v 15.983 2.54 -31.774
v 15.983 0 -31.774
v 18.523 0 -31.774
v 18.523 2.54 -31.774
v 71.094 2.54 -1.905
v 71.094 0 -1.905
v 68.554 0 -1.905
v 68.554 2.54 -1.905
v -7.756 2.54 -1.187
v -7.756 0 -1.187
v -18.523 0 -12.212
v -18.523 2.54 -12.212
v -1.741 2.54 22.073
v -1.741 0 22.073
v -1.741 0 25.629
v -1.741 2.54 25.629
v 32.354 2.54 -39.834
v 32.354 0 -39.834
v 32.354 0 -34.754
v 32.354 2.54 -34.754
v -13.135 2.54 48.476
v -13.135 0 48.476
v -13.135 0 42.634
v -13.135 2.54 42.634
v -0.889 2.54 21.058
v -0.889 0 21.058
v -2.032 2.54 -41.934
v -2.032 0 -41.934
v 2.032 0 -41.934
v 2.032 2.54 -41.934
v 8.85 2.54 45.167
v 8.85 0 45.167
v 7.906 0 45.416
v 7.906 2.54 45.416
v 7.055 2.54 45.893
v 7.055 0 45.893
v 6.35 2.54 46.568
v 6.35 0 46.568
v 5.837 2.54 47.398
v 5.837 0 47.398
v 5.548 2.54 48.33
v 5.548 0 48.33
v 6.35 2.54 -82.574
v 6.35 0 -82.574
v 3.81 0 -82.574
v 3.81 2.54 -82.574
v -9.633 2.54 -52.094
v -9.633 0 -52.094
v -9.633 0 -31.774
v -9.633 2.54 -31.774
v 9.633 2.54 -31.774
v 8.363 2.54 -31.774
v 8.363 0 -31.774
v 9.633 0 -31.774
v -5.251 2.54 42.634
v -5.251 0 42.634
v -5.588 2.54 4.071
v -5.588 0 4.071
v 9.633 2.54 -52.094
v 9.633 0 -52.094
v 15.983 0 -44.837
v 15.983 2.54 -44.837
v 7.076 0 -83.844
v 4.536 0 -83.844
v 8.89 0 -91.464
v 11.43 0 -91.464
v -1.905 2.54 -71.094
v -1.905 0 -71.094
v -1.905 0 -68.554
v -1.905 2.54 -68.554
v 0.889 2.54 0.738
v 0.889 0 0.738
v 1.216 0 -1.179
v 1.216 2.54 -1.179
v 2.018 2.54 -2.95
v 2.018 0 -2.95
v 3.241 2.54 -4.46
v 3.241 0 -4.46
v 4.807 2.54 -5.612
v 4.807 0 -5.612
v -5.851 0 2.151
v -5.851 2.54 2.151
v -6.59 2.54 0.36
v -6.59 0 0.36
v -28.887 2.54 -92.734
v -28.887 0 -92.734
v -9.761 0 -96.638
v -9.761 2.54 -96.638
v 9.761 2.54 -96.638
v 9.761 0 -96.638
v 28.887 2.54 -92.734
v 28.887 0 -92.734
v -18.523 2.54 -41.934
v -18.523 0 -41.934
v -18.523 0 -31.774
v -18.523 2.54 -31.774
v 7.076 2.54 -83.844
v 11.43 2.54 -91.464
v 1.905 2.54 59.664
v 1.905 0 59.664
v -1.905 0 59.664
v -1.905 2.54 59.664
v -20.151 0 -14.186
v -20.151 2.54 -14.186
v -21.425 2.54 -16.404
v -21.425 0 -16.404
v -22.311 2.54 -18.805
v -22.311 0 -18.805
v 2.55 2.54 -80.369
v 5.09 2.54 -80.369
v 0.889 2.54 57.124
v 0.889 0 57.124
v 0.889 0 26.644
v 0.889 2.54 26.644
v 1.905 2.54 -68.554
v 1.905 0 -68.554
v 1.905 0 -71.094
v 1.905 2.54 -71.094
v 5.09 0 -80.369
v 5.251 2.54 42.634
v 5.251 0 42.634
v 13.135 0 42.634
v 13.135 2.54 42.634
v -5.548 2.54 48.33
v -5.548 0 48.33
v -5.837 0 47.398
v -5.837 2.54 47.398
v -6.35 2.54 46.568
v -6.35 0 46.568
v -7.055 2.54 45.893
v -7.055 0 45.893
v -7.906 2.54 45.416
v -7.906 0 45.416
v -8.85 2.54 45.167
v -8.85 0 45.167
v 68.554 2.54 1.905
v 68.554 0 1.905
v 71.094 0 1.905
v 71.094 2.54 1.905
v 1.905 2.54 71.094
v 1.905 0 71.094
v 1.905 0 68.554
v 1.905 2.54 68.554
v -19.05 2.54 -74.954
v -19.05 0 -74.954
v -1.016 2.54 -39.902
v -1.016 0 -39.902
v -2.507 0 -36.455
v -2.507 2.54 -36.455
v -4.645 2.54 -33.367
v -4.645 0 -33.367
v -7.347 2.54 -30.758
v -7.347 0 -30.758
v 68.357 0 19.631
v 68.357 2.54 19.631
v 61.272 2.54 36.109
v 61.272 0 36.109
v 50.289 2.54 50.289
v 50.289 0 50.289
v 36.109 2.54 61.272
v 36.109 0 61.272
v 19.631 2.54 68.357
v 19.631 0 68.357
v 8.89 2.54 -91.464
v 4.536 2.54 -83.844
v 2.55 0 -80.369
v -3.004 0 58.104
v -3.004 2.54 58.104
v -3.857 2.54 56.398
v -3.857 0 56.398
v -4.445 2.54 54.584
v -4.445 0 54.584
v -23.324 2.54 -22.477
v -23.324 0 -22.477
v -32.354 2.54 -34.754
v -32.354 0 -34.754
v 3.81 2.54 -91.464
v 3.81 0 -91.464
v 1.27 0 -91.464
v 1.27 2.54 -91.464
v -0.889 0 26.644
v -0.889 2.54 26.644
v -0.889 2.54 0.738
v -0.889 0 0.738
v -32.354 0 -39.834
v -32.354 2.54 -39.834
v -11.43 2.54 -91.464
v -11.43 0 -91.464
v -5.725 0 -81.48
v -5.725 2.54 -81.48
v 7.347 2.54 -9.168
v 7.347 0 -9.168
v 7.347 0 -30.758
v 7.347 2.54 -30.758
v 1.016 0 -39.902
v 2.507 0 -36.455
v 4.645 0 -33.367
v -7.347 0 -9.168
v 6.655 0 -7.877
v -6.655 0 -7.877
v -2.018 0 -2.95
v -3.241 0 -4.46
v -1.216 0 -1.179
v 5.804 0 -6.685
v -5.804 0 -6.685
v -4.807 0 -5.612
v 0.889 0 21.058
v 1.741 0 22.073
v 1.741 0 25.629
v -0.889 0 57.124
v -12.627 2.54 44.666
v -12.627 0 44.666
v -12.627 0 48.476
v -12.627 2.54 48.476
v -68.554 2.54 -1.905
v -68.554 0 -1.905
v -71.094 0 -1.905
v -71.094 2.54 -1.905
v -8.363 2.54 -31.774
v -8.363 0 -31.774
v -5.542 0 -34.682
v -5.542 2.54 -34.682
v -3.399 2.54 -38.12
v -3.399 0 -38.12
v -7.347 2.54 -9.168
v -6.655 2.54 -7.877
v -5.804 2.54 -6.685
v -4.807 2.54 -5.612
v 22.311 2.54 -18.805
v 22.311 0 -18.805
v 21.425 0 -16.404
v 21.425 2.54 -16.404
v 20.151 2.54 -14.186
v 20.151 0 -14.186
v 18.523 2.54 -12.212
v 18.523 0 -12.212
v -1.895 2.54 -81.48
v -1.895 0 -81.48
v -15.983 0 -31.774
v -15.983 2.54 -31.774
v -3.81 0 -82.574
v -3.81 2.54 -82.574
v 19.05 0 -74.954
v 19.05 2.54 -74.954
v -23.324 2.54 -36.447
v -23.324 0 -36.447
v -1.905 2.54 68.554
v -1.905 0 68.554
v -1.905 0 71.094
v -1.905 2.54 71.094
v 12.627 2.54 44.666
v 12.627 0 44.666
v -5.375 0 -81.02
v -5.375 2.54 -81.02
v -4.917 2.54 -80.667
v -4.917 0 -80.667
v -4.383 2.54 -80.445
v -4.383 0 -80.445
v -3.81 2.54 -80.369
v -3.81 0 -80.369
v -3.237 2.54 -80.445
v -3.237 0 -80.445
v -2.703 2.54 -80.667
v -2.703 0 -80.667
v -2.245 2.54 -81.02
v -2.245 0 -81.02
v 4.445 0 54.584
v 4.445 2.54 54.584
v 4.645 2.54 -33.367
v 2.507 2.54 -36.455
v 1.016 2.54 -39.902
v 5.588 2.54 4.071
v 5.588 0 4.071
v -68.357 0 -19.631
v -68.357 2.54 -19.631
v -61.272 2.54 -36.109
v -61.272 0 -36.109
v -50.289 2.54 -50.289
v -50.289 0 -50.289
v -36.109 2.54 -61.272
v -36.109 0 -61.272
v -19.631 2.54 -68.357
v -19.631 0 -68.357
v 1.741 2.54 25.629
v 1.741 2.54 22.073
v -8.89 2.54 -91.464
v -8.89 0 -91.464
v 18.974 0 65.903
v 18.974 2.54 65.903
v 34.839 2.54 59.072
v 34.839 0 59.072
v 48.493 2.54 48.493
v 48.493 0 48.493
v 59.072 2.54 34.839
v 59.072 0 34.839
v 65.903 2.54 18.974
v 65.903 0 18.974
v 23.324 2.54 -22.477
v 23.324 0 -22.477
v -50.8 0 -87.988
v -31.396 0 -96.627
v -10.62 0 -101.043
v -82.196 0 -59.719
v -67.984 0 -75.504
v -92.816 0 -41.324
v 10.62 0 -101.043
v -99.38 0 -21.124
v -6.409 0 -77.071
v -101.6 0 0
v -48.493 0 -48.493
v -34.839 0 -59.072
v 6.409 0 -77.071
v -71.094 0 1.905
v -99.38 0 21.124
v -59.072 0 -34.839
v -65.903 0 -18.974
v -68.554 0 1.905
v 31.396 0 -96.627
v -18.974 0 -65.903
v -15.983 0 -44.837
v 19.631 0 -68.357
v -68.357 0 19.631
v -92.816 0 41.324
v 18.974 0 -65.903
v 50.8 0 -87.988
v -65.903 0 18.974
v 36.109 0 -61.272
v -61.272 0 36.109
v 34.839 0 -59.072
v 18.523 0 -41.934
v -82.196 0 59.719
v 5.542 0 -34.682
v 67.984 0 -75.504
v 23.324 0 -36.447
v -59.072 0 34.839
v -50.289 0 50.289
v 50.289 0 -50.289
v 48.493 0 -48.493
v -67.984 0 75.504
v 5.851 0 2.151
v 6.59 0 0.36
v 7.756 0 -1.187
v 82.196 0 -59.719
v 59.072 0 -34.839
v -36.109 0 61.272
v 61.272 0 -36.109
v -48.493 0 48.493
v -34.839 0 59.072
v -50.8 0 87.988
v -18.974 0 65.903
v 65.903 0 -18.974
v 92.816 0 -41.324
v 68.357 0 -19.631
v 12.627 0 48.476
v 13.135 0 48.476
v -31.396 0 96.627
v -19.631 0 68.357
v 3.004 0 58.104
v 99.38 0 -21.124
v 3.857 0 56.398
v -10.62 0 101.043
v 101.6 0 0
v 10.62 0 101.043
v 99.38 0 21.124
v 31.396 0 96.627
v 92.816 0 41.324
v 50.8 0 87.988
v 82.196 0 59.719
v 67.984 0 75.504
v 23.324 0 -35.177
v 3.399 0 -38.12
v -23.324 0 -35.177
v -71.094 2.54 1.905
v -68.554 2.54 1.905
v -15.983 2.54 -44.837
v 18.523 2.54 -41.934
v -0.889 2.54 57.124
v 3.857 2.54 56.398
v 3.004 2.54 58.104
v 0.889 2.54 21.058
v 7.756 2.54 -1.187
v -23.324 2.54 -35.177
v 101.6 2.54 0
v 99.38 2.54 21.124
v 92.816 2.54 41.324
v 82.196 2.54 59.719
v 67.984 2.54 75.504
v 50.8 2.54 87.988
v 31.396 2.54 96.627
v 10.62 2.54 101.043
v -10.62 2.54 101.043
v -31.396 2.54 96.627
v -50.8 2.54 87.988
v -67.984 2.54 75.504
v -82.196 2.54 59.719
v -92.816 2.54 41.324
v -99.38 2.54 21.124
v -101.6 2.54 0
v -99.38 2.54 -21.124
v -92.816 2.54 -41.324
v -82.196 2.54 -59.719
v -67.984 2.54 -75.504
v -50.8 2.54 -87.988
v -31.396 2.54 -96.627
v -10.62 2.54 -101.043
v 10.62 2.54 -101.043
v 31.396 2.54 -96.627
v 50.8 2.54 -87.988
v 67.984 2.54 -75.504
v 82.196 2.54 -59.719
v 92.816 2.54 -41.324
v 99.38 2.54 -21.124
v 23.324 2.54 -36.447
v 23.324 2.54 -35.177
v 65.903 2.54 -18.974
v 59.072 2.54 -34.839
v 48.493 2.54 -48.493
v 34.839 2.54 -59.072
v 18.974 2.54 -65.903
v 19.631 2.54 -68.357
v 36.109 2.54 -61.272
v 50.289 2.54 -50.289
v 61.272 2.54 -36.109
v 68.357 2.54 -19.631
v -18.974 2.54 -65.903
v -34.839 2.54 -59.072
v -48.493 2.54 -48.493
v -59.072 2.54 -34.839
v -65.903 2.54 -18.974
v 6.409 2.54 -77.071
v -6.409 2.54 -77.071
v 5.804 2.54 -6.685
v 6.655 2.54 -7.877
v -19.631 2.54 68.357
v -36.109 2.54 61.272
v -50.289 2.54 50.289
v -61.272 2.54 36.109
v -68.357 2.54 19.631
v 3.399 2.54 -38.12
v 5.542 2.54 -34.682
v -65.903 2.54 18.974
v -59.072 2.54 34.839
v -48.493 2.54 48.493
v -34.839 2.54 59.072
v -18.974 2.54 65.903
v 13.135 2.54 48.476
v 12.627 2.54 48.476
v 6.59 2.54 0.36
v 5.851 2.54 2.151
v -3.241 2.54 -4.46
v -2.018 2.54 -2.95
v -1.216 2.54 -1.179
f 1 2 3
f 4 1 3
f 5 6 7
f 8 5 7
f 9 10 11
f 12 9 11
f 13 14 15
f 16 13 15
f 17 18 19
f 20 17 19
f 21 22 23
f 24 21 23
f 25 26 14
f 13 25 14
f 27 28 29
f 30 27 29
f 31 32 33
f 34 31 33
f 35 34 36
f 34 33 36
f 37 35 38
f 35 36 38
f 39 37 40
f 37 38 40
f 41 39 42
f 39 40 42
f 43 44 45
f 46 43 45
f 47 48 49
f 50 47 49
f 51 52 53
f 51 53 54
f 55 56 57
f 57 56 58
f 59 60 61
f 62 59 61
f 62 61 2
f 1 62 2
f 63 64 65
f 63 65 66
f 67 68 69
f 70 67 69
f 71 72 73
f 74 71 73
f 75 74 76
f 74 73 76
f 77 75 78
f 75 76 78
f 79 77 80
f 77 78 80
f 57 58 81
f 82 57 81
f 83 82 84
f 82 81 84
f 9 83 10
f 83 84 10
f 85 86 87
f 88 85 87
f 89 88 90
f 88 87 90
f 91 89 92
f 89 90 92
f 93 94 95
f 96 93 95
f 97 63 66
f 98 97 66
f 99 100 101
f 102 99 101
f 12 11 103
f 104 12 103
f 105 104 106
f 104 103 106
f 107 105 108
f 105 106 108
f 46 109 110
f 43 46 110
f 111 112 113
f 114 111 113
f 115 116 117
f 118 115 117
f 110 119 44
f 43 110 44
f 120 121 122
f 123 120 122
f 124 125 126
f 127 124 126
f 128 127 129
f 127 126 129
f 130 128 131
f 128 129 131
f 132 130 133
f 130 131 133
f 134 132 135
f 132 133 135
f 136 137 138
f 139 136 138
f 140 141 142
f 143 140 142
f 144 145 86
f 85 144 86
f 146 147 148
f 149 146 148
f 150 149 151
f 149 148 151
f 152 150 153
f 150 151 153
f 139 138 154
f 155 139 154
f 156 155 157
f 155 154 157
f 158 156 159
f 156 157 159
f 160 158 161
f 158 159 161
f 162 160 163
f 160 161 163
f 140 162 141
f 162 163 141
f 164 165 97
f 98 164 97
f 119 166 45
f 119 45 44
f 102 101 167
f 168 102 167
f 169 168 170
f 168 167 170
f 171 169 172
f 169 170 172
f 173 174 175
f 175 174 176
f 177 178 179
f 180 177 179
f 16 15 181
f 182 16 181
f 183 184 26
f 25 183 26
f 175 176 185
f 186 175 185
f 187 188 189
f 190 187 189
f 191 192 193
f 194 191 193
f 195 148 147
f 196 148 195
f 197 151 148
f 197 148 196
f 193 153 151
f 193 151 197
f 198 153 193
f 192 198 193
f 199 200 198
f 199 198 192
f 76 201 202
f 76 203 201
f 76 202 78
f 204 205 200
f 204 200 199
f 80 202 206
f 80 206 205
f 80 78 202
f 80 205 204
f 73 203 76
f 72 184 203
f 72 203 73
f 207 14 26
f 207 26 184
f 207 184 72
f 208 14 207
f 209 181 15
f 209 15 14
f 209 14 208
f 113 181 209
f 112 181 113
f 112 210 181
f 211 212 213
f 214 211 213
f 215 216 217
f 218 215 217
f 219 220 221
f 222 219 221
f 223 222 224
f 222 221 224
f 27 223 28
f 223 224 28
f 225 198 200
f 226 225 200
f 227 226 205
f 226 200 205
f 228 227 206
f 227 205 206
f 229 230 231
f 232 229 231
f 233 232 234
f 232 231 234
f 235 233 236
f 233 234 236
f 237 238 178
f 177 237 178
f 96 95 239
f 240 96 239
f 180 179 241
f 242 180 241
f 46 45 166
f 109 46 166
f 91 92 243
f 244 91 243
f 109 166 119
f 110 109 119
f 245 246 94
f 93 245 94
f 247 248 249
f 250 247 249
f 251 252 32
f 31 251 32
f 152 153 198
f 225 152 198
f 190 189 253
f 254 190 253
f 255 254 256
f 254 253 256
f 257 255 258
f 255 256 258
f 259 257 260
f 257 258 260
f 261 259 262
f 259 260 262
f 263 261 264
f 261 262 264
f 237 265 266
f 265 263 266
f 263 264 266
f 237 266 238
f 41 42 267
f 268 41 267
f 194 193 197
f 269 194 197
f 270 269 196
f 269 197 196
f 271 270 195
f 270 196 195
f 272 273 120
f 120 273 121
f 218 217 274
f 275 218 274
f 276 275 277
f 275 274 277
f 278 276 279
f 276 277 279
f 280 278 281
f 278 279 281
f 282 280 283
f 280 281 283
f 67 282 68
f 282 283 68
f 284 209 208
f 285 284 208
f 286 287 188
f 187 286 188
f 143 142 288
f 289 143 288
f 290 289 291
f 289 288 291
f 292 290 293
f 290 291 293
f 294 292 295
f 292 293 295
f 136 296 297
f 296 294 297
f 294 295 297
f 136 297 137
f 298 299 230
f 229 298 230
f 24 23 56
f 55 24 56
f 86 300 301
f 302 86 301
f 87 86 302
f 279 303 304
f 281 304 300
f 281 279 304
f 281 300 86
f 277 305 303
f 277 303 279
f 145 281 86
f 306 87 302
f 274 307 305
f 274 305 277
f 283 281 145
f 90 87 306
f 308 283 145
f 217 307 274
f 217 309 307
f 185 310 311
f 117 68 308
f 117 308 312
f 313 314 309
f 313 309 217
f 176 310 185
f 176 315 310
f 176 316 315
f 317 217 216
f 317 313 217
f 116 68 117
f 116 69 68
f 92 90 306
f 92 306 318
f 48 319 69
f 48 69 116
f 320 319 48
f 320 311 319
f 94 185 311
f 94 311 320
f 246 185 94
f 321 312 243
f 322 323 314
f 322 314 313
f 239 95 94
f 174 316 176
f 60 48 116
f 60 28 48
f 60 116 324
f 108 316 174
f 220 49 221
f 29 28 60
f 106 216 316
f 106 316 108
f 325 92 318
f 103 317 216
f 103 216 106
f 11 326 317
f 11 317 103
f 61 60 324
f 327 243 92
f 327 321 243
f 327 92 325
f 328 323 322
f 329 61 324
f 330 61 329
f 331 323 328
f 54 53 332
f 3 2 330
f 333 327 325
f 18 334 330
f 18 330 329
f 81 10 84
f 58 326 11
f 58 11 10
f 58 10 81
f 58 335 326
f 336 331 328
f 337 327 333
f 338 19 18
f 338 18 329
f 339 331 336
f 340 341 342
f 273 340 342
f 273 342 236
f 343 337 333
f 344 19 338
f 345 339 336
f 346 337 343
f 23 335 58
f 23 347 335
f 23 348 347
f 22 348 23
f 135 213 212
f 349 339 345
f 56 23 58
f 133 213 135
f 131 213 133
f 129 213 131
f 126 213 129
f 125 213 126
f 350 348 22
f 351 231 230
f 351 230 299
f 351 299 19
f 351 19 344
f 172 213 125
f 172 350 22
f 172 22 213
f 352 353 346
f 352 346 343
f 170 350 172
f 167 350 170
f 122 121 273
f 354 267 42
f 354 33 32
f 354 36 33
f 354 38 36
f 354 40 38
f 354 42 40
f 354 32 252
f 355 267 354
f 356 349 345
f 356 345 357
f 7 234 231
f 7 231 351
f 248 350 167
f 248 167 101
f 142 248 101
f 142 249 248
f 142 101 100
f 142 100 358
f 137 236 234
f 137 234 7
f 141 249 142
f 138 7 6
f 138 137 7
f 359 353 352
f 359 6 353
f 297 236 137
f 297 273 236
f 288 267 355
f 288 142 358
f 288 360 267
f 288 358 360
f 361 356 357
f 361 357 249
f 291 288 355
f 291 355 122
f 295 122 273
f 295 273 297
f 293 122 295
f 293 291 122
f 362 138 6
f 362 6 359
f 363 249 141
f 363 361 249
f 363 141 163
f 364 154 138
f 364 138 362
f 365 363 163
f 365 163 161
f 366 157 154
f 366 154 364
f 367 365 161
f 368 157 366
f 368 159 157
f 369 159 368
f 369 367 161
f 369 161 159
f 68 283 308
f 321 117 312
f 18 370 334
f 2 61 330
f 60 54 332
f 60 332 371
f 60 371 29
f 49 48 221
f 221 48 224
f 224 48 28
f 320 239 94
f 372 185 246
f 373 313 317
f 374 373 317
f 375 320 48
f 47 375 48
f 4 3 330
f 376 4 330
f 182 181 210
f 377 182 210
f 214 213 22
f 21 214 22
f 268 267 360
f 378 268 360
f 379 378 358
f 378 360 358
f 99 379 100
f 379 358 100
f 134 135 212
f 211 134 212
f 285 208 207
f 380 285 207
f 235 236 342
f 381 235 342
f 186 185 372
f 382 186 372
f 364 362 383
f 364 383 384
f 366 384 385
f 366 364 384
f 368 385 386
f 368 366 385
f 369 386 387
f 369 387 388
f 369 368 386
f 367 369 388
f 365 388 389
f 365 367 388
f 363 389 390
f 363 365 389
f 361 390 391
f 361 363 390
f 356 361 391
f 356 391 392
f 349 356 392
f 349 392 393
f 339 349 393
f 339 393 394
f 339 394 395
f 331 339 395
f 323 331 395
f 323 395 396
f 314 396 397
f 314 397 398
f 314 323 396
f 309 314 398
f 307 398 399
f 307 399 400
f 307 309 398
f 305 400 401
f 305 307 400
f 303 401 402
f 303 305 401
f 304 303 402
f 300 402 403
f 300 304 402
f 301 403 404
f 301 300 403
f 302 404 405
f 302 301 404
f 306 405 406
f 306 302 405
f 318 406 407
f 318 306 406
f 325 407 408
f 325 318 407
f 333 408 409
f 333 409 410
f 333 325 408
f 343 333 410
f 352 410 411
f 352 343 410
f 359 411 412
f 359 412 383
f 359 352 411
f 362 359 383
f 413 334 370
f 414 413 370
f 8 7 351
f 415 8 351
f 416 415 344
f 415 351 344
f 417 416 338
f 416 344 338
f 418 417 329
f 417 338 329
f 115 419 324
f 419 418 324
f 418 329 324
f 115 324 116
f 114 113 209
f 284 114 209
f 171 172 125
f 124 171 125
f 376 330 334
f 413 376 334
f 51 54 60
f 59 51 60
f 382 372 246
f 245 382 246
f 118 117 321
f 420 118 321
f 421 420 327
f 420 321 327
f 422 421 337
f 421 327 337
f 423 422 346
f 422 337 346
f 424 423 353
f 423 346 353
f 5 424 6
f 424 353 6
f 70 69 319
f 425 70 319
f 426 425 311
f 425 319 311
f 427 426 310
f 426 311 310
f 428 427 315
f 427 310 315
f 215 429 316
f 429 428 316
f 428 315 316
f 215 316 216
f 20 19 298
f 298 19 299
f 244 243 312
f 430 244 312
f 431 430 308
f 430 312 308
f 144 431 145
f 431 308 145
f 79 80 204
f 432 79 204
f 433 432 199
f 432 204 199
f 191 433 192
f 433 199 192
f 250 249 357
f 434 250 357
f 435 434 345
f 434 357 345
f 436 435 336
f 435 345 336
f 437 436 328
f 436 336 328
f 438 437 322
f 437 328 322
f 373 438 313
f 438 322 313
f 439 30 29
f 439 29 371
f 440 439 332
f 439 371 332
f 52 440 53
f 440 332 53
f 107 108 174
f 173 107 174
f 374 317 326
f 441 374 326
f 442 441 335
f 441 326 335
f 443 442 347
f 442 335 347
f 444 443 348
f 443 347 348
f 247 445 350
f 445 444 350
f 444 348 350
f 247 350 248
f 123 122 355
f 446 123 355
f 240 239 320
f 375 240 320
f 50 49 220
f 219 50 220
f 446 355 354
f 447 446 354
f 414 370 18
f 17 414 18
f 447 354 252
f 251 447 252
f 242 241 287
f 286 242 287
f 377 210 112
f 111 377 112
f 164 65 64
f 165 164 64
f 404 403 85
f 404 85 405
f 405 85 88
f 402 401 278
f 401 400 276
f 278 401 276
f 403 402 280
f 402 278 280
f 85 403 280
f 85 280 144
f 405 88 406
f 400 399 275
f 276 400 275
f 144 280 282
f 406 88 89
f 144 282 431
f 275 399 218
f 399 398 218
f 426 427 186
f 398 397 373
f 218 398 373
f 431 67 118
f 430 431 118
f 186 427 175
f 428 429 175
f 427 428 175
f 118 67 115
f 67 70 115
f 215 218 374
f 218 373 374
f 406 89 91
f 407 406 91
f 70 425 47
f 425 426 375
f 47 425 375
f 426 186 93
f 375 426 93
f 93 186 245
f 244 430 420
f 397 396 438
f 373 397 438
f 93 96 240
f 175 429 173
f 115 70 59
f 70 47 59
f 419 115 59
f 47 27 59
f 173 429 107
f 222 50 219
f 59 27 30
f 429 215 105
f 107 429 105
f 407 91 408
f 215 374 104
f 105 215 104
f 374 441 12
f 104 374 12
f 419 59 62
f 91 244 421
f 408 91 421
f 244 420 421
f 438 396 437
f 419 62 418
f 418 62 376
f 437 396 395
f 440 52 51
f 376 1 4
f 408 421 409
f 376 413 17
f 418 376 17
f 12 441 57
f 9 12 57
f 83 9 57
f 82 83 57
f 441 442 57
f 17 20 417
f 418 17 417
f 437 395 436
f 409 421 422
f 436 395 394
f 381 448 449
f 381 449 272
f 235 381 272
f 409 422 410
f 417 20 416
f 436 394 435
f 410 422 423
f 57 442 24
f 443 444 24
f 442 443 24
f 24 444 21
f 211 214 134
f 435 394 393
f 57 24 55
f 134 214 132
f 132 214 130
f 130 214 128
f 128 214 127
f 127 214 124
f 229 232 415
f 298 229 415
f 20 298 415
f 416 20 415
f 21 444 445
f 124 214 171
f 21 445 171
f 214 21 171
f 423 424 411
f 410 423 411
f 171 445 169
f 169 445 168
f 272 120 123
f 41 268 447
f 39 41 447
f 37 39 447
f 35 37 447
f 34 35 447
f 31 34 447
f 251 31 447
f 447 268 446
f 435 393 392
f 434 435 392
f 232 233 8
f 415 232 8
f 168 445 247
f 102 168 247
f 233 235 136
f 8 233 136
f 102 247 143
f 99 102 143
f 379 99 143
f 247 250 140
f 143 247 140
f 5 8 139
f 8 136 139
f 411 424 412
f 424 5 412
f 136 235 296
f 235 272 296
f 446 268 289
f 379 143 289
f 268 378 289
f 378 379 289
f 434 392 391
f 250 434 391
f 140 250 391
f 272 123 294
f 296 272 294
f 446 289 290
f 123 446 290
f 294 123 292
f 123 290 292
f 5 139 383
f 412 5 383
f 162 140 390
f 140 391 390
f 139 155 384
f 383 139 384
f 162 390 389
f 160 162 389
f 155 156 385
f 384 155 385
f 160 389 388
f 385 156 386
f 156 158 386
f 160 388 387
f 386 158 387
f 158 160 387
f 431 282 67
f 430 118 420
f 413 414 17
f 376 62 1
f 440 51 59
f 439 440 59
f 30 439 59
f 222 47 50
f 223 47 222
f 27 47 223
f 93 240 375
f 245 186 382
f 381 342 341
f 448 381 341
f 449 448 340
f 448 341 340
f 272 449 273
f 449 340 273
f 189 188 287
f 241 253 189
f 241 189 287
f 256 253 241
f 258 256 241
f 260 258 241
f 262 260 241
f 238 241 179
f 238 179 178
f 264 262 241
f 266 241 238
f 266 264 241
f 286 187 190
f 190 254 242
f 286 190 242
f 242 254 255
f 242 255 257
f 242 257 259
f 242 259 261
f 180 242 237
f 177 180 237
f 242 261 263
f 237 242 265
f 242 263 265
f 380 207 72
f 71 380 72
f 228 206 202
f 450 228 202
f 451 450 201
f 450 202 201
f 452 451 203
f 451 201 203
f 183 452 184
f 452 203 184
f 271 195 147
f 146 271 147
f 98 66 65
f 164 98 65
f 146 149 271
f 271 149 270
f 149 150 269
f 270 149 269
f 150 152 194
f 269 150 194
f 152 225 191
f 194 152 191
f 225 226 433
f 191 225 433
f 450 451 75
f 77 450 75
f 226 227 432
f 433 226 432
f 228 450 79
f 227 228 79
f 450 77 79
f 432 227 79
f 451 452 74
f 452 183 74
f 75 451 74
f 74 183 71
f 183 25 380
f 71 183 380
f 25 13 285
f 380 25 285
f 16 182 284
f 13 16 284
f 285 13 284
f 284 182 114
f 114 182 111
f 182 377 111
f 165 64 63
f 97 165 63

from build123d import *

# Parameters (mm, degrees)
F0_R     = 101.6
F1_DEPTH = 2.54
F3_DEPTH = 25.4
F5_DEPTH = 25.4
F7_DEPTH = 25.4


with BuildPart() as f1:
    # F0 (on Front) → F1 (new body)
    with BuildSketch(Plane.XZ):
        Circle(F0_R)
    extrude(amount=-F1_DEPTH)

    # F2 (on face) → F3 (cut)
    with BuildSketch(Plane.XZ):
        with BuildLine():
            Line((-68.553537, -1.905), (-71.094482, -1.905))
            ThreePointArc((-71.094482, -1.905), (-50.289434, -50.289434), (-1.905, -71.094482))
            Line((-1.905, -71.094482), (-1.905, -68.553537))
            ThreePointArc((-1.905, -68.553537), (-48.493383, -48.493383), (-68.553537, -1.905))
        make_face()
        with BuildLine():
            Line((-71.094482, 1.905), (-68.553537, 1.905))
            ThreePointArc((-68.553537, 1.905), (-48.493383, 48.493383), (-1.905, 68.553537))
            Line((-1.905, 68.553537), (-1.905, 71.094482))
            ThreePointArc((-1.905, 71.094482), (-50.289434, 50.289434), (-71.094482, 1.905))
        make_face()
        with BuildLine():
            Line((1.905, 71.094482), (1.905, 68.553537))
            ThreePointArc((1.905, 68.553537), (48.493383, 48.493383), (68.553537, 1.905))
            Line((68.553537, 1.905), (71.094482, 1.905))
            ThreePointArc((71.094482, 1.905), (50.289434, 50.289434), (1.905, 71.094482))
        make_face()
        with BuildLine():
            Line((71.094482, -1.905), (68.553537, -1.905))
            ThreePointArc((68.553537, -1.905), (48.493383, -48.493383), (1.905, -68.553537))
            Line((1.905, -68.553537), (1.905, -71.094482))
            ThreePointArc((1.905, -71.094482), (50.289434, -50.289434), (71.094482, -1.905))
        make_face()
    extrude(amount=-F3_DEPTH, mode=Mode.SUBTRACT)

    # F4 (on face) → F5 (cut)
    with BuildSketch(Plane.XZ):
        with BuildLine():
            Line((1.905, 59.663537), (0, 59.663537))
            Line((0, 59.663537), (0, 57.123537))
            Line((0, 57.123537), (0.889, 57.123537))
            Line((0.889, 57.123537), (0.889, 26.643537))
            Line((0.889, 26.643537), (1.740593, 25.628647))
            Line((1.740593, 25.628647), (1.740593, 22.072647))
            Line((1.740593, 22.072647), (0.889, 21.057757))
            Line((0.889, 21.057757), (0.889, 0.737757))
            ThreePointArc((0.889, 0.737757), (2.017691, -2.949643), (4.807212, -5.612243))
            ThreePointArc((4.807212, -5.612243), (6.248737, -7.267725), (7.347212, -9.168243))
            Line((7.347212, -9.168243), (7.347212, -30.758243))
            ThreePointArc((7.347212, -30.758243), (3.499435, -34.857914), (1.016, -39.902243))
            Line((1.016, -39.902243), (0, -39.902243))
            Line((0, -39.902243), (0, -41.934243))
            Line((0, -41.934243), (2.032, -41.934243))
            ThreePointArc((2.032, -41.934243), (4.378791, -36.343997), (8.363212, -31.774243))
            Line((8.363212, -31.774243), (9.633212, -31.774243))
            Line((9.633212, -31.774243), (9.633212, -52.094243))
            Line((9.633212, -52.094243), (15.983212, -44.8371))
            Line((15.983212, -44.8371), (15.983212, -31.774243))
            Line((15.983212, -31.774243), (18.523212, -31.774243))
            Line((18.523212, -31.774243), (18.523212, -41.934243))
            Line((18.523212, -41.934243), (23.324368, -36.447207))
            Line((23.324368, -36.447207), (23.324368, -35.177207))
            Line((23.324368, -35.177207), (32.354376, -39.833874))
            Line((32.354376, -39.833874), (32.354376, -34.753874))
            Line((32.354376, -34.753874), (23.324368, -22.477207))
            Line((23.324368, -22.477207), (22.310513, -18.804579))
            ThreePointArc((22.310513, -18.804579), (20.83457, -15.268376), (18.523212, -12.21211))
            Line((18.523212, -12.21211), (7.756104, -1.186821))
            ThreePointArc((7.756104, -1.186821), (6.163207, 1.232062), (5.588, 4.070628))
            Line((5.588, 4.070628), (5.25146, 42.634253))
            Line((5.25146, 42.634253), (13.134678, 42.634253))
            Line((13.134678, 42.634253), (13.134678, 48.476253))
            Line((13.134678, 48.476253), (12.626678, 48.476253))
            Line((12.626678, 48.476253), (12.626678, 44.666253))
            Line((12.626678, 44.666253), (8.849666, 45.166535))
            ThreePointArc((8.849666, 45.166535), (6.681256, 46.208204), (5.547666, 48.330007))
            Line((5.547666, 48.330007), (4.445, 54.583537))
            ThreePointArc((4.445, 54.583537), (3.462622, 57.267348), (1.905, 59.663537))
        make_face()
        with BuildLine():
            Line((0, 59.663537), (-1.905, 59.663537))
            ThreePointArc((-1.905, 59.663537), (-3.462622, 57.267348), (-4.445, 54.583537))
            Line((-4.445, 54.583537), (-5.547666, 48.330007))
            ThreePointArc((-5.547666, 48.330007), (-6.681256, 46.208204), (-8.849666, 45.166535))
            Line((-8.849666, 45.166535), (-12.626678, 44.666253))
            Line((-12.626678, 44.666253), (-12.626678, 48.476253))
            Line((-12.626678, 48.476253), (-13.134678, 48.476253))
            Line((-13.134678, 48.476253), (-13.134678, 42.634253))
            Line((-13.134678, 42.634253), (-5.25146, 42.634253))
            Line((-5.25146, 42.634253), (-5.588, 4.070628))
            ThreePointArc((-5.588, 4.070628), (-6.163207, 1.232062), (-7.756104, -1.186821))
            Line((-7.756104, -1.186821), (-18.523212, -12.21211))
            ThreePointArc((-18.523212, -12.21211), (-20.83457, -15.268376), (-22.310513, -18.804579))
            Line((-22.310513, -18.804579), (-23.324368, -22.477207))
            Line((-23.324368, -22.477207), (-32.354376, -34.753874))
            Line((-32.354376, -34.753874), (-32.354376, -39.833874))
            Line((-32.354376, -39.833874), (-23.324368, -35.177207))
            Line((-23.324368, -35.177207), (-23.324368, -36.447207))
            Line((-23.324368, -36.447207), (-18.523212, -41.934243))
            Line((-18.523212, -41.934243), (-18.523212, -31.774243))
            Line((-18.523212, -31.774243), (-15.983212, -31.774243))
            Line((-15.983212, -31.774243), (-15.983212, -44.8371))
            Line((-15.983212, -44.8371), (-9.633212, -52.094243))
            Line((-9.633212, -52.094243), (-9.633212, -31.774243))
            Line((-9.633212, -31.774243), (-8.363212, -31.774243))
            ThreePointArc((-8.363212, -31.774243), (-4.378791, -36.343997), (-2.032, -41.934243))
            Line((-2.032, -41.934243), (0, -41.934243))
            Line((0, -41.934243), (0, -39.902243))
            Line((0, -39.902243), (-1.016, -39.902243))
            ThreePointArc((-1.016, -39.902243), (-3.499435, -34.857914), (-7.347212, -30.758243))
            Line((-7.347212, -30.758243), (-7.347212, -9.168243))
            ThreePointArc((-7.347212, -9.168243), (-6.248737, -7.267725), (-4.807212, -5.612243))
            ThreePointArc((-4.807212, -5.612243), (-2.017691, -2.949643), (-0.889, 0.737757))
            Line((-0.889, 0.737757), (-0.889, 21.057757))
            Line((-0.889, 21.057757), (-1.740593, 22.072647))
            Line((-1.740593, 22.072647), (-1.740593, 25.628647))
            Line((-1.740593, 25.628647), (-0.889, 26.643537))
            Line((-0.889, 26.643537), (-0.889, 57.123537))
            Line((-0.889, 57.123537), (0, 57.123537))
            Line((0, 57.123537), (0, 59.663537))
        make_face()
    extrude(amount=-F5_DEPTH, mode=Mode.SUBTRACT)

    # F6 (on face) → F7 (cut)
    with BuildSketch(Plane.XZ):
        with BuildLine():
            Line((-19.05, -74.954243), (-28.887378, -92.734243))
            ThreePointArc((-28.887378, -92.734243), (0, -97.1294), (28.887378, -92.734243))
            Line((28.887378, -92.734243), (19.05, -74.954243))
            ThreePointArc((19.05, -74.954243), (0, -77.33719), (-19.05, -74.954243))
        make_face()
        with BuildLine():
            Line((-3.81, -82.574243), (-8.89, -91.464243))
            Line((-8.89, -91.464243), (-11.43, -91.464243))
            Line((-11.43, -91.464243), (-5.724769, -81.480089))
            ThreePointArc((-5.724769, -81.480089), (-3.81, -80.368905), (-1.895231, -81.480089))
            Line((-1.895231, -81.480089), (3.81, -91.464243))
            Line((3.81, -91.464243), (1.27, -91.464243))
            Line((1.27, -91.464243), (-3.81, -82.574243))
        make_face(mode=Mode.SUBTRACT)
        Polygon((6.35, -82.574243), (3.81, -82.574243), (2.549807, -80.368905), (5.089807, -80.368905), align=None, mode=Mode.SUBTRACT)
        Polygon((11.43, -91.464243), (8.89, -91.464243), (4.535714, -83.844243), (7.075714, -83.844243), align=None, mode=Mode.SUBTRACT)
    extrude(amount=-F7_DEPTH, mode=Mode.SUBTRACT)


solid = f1.part
